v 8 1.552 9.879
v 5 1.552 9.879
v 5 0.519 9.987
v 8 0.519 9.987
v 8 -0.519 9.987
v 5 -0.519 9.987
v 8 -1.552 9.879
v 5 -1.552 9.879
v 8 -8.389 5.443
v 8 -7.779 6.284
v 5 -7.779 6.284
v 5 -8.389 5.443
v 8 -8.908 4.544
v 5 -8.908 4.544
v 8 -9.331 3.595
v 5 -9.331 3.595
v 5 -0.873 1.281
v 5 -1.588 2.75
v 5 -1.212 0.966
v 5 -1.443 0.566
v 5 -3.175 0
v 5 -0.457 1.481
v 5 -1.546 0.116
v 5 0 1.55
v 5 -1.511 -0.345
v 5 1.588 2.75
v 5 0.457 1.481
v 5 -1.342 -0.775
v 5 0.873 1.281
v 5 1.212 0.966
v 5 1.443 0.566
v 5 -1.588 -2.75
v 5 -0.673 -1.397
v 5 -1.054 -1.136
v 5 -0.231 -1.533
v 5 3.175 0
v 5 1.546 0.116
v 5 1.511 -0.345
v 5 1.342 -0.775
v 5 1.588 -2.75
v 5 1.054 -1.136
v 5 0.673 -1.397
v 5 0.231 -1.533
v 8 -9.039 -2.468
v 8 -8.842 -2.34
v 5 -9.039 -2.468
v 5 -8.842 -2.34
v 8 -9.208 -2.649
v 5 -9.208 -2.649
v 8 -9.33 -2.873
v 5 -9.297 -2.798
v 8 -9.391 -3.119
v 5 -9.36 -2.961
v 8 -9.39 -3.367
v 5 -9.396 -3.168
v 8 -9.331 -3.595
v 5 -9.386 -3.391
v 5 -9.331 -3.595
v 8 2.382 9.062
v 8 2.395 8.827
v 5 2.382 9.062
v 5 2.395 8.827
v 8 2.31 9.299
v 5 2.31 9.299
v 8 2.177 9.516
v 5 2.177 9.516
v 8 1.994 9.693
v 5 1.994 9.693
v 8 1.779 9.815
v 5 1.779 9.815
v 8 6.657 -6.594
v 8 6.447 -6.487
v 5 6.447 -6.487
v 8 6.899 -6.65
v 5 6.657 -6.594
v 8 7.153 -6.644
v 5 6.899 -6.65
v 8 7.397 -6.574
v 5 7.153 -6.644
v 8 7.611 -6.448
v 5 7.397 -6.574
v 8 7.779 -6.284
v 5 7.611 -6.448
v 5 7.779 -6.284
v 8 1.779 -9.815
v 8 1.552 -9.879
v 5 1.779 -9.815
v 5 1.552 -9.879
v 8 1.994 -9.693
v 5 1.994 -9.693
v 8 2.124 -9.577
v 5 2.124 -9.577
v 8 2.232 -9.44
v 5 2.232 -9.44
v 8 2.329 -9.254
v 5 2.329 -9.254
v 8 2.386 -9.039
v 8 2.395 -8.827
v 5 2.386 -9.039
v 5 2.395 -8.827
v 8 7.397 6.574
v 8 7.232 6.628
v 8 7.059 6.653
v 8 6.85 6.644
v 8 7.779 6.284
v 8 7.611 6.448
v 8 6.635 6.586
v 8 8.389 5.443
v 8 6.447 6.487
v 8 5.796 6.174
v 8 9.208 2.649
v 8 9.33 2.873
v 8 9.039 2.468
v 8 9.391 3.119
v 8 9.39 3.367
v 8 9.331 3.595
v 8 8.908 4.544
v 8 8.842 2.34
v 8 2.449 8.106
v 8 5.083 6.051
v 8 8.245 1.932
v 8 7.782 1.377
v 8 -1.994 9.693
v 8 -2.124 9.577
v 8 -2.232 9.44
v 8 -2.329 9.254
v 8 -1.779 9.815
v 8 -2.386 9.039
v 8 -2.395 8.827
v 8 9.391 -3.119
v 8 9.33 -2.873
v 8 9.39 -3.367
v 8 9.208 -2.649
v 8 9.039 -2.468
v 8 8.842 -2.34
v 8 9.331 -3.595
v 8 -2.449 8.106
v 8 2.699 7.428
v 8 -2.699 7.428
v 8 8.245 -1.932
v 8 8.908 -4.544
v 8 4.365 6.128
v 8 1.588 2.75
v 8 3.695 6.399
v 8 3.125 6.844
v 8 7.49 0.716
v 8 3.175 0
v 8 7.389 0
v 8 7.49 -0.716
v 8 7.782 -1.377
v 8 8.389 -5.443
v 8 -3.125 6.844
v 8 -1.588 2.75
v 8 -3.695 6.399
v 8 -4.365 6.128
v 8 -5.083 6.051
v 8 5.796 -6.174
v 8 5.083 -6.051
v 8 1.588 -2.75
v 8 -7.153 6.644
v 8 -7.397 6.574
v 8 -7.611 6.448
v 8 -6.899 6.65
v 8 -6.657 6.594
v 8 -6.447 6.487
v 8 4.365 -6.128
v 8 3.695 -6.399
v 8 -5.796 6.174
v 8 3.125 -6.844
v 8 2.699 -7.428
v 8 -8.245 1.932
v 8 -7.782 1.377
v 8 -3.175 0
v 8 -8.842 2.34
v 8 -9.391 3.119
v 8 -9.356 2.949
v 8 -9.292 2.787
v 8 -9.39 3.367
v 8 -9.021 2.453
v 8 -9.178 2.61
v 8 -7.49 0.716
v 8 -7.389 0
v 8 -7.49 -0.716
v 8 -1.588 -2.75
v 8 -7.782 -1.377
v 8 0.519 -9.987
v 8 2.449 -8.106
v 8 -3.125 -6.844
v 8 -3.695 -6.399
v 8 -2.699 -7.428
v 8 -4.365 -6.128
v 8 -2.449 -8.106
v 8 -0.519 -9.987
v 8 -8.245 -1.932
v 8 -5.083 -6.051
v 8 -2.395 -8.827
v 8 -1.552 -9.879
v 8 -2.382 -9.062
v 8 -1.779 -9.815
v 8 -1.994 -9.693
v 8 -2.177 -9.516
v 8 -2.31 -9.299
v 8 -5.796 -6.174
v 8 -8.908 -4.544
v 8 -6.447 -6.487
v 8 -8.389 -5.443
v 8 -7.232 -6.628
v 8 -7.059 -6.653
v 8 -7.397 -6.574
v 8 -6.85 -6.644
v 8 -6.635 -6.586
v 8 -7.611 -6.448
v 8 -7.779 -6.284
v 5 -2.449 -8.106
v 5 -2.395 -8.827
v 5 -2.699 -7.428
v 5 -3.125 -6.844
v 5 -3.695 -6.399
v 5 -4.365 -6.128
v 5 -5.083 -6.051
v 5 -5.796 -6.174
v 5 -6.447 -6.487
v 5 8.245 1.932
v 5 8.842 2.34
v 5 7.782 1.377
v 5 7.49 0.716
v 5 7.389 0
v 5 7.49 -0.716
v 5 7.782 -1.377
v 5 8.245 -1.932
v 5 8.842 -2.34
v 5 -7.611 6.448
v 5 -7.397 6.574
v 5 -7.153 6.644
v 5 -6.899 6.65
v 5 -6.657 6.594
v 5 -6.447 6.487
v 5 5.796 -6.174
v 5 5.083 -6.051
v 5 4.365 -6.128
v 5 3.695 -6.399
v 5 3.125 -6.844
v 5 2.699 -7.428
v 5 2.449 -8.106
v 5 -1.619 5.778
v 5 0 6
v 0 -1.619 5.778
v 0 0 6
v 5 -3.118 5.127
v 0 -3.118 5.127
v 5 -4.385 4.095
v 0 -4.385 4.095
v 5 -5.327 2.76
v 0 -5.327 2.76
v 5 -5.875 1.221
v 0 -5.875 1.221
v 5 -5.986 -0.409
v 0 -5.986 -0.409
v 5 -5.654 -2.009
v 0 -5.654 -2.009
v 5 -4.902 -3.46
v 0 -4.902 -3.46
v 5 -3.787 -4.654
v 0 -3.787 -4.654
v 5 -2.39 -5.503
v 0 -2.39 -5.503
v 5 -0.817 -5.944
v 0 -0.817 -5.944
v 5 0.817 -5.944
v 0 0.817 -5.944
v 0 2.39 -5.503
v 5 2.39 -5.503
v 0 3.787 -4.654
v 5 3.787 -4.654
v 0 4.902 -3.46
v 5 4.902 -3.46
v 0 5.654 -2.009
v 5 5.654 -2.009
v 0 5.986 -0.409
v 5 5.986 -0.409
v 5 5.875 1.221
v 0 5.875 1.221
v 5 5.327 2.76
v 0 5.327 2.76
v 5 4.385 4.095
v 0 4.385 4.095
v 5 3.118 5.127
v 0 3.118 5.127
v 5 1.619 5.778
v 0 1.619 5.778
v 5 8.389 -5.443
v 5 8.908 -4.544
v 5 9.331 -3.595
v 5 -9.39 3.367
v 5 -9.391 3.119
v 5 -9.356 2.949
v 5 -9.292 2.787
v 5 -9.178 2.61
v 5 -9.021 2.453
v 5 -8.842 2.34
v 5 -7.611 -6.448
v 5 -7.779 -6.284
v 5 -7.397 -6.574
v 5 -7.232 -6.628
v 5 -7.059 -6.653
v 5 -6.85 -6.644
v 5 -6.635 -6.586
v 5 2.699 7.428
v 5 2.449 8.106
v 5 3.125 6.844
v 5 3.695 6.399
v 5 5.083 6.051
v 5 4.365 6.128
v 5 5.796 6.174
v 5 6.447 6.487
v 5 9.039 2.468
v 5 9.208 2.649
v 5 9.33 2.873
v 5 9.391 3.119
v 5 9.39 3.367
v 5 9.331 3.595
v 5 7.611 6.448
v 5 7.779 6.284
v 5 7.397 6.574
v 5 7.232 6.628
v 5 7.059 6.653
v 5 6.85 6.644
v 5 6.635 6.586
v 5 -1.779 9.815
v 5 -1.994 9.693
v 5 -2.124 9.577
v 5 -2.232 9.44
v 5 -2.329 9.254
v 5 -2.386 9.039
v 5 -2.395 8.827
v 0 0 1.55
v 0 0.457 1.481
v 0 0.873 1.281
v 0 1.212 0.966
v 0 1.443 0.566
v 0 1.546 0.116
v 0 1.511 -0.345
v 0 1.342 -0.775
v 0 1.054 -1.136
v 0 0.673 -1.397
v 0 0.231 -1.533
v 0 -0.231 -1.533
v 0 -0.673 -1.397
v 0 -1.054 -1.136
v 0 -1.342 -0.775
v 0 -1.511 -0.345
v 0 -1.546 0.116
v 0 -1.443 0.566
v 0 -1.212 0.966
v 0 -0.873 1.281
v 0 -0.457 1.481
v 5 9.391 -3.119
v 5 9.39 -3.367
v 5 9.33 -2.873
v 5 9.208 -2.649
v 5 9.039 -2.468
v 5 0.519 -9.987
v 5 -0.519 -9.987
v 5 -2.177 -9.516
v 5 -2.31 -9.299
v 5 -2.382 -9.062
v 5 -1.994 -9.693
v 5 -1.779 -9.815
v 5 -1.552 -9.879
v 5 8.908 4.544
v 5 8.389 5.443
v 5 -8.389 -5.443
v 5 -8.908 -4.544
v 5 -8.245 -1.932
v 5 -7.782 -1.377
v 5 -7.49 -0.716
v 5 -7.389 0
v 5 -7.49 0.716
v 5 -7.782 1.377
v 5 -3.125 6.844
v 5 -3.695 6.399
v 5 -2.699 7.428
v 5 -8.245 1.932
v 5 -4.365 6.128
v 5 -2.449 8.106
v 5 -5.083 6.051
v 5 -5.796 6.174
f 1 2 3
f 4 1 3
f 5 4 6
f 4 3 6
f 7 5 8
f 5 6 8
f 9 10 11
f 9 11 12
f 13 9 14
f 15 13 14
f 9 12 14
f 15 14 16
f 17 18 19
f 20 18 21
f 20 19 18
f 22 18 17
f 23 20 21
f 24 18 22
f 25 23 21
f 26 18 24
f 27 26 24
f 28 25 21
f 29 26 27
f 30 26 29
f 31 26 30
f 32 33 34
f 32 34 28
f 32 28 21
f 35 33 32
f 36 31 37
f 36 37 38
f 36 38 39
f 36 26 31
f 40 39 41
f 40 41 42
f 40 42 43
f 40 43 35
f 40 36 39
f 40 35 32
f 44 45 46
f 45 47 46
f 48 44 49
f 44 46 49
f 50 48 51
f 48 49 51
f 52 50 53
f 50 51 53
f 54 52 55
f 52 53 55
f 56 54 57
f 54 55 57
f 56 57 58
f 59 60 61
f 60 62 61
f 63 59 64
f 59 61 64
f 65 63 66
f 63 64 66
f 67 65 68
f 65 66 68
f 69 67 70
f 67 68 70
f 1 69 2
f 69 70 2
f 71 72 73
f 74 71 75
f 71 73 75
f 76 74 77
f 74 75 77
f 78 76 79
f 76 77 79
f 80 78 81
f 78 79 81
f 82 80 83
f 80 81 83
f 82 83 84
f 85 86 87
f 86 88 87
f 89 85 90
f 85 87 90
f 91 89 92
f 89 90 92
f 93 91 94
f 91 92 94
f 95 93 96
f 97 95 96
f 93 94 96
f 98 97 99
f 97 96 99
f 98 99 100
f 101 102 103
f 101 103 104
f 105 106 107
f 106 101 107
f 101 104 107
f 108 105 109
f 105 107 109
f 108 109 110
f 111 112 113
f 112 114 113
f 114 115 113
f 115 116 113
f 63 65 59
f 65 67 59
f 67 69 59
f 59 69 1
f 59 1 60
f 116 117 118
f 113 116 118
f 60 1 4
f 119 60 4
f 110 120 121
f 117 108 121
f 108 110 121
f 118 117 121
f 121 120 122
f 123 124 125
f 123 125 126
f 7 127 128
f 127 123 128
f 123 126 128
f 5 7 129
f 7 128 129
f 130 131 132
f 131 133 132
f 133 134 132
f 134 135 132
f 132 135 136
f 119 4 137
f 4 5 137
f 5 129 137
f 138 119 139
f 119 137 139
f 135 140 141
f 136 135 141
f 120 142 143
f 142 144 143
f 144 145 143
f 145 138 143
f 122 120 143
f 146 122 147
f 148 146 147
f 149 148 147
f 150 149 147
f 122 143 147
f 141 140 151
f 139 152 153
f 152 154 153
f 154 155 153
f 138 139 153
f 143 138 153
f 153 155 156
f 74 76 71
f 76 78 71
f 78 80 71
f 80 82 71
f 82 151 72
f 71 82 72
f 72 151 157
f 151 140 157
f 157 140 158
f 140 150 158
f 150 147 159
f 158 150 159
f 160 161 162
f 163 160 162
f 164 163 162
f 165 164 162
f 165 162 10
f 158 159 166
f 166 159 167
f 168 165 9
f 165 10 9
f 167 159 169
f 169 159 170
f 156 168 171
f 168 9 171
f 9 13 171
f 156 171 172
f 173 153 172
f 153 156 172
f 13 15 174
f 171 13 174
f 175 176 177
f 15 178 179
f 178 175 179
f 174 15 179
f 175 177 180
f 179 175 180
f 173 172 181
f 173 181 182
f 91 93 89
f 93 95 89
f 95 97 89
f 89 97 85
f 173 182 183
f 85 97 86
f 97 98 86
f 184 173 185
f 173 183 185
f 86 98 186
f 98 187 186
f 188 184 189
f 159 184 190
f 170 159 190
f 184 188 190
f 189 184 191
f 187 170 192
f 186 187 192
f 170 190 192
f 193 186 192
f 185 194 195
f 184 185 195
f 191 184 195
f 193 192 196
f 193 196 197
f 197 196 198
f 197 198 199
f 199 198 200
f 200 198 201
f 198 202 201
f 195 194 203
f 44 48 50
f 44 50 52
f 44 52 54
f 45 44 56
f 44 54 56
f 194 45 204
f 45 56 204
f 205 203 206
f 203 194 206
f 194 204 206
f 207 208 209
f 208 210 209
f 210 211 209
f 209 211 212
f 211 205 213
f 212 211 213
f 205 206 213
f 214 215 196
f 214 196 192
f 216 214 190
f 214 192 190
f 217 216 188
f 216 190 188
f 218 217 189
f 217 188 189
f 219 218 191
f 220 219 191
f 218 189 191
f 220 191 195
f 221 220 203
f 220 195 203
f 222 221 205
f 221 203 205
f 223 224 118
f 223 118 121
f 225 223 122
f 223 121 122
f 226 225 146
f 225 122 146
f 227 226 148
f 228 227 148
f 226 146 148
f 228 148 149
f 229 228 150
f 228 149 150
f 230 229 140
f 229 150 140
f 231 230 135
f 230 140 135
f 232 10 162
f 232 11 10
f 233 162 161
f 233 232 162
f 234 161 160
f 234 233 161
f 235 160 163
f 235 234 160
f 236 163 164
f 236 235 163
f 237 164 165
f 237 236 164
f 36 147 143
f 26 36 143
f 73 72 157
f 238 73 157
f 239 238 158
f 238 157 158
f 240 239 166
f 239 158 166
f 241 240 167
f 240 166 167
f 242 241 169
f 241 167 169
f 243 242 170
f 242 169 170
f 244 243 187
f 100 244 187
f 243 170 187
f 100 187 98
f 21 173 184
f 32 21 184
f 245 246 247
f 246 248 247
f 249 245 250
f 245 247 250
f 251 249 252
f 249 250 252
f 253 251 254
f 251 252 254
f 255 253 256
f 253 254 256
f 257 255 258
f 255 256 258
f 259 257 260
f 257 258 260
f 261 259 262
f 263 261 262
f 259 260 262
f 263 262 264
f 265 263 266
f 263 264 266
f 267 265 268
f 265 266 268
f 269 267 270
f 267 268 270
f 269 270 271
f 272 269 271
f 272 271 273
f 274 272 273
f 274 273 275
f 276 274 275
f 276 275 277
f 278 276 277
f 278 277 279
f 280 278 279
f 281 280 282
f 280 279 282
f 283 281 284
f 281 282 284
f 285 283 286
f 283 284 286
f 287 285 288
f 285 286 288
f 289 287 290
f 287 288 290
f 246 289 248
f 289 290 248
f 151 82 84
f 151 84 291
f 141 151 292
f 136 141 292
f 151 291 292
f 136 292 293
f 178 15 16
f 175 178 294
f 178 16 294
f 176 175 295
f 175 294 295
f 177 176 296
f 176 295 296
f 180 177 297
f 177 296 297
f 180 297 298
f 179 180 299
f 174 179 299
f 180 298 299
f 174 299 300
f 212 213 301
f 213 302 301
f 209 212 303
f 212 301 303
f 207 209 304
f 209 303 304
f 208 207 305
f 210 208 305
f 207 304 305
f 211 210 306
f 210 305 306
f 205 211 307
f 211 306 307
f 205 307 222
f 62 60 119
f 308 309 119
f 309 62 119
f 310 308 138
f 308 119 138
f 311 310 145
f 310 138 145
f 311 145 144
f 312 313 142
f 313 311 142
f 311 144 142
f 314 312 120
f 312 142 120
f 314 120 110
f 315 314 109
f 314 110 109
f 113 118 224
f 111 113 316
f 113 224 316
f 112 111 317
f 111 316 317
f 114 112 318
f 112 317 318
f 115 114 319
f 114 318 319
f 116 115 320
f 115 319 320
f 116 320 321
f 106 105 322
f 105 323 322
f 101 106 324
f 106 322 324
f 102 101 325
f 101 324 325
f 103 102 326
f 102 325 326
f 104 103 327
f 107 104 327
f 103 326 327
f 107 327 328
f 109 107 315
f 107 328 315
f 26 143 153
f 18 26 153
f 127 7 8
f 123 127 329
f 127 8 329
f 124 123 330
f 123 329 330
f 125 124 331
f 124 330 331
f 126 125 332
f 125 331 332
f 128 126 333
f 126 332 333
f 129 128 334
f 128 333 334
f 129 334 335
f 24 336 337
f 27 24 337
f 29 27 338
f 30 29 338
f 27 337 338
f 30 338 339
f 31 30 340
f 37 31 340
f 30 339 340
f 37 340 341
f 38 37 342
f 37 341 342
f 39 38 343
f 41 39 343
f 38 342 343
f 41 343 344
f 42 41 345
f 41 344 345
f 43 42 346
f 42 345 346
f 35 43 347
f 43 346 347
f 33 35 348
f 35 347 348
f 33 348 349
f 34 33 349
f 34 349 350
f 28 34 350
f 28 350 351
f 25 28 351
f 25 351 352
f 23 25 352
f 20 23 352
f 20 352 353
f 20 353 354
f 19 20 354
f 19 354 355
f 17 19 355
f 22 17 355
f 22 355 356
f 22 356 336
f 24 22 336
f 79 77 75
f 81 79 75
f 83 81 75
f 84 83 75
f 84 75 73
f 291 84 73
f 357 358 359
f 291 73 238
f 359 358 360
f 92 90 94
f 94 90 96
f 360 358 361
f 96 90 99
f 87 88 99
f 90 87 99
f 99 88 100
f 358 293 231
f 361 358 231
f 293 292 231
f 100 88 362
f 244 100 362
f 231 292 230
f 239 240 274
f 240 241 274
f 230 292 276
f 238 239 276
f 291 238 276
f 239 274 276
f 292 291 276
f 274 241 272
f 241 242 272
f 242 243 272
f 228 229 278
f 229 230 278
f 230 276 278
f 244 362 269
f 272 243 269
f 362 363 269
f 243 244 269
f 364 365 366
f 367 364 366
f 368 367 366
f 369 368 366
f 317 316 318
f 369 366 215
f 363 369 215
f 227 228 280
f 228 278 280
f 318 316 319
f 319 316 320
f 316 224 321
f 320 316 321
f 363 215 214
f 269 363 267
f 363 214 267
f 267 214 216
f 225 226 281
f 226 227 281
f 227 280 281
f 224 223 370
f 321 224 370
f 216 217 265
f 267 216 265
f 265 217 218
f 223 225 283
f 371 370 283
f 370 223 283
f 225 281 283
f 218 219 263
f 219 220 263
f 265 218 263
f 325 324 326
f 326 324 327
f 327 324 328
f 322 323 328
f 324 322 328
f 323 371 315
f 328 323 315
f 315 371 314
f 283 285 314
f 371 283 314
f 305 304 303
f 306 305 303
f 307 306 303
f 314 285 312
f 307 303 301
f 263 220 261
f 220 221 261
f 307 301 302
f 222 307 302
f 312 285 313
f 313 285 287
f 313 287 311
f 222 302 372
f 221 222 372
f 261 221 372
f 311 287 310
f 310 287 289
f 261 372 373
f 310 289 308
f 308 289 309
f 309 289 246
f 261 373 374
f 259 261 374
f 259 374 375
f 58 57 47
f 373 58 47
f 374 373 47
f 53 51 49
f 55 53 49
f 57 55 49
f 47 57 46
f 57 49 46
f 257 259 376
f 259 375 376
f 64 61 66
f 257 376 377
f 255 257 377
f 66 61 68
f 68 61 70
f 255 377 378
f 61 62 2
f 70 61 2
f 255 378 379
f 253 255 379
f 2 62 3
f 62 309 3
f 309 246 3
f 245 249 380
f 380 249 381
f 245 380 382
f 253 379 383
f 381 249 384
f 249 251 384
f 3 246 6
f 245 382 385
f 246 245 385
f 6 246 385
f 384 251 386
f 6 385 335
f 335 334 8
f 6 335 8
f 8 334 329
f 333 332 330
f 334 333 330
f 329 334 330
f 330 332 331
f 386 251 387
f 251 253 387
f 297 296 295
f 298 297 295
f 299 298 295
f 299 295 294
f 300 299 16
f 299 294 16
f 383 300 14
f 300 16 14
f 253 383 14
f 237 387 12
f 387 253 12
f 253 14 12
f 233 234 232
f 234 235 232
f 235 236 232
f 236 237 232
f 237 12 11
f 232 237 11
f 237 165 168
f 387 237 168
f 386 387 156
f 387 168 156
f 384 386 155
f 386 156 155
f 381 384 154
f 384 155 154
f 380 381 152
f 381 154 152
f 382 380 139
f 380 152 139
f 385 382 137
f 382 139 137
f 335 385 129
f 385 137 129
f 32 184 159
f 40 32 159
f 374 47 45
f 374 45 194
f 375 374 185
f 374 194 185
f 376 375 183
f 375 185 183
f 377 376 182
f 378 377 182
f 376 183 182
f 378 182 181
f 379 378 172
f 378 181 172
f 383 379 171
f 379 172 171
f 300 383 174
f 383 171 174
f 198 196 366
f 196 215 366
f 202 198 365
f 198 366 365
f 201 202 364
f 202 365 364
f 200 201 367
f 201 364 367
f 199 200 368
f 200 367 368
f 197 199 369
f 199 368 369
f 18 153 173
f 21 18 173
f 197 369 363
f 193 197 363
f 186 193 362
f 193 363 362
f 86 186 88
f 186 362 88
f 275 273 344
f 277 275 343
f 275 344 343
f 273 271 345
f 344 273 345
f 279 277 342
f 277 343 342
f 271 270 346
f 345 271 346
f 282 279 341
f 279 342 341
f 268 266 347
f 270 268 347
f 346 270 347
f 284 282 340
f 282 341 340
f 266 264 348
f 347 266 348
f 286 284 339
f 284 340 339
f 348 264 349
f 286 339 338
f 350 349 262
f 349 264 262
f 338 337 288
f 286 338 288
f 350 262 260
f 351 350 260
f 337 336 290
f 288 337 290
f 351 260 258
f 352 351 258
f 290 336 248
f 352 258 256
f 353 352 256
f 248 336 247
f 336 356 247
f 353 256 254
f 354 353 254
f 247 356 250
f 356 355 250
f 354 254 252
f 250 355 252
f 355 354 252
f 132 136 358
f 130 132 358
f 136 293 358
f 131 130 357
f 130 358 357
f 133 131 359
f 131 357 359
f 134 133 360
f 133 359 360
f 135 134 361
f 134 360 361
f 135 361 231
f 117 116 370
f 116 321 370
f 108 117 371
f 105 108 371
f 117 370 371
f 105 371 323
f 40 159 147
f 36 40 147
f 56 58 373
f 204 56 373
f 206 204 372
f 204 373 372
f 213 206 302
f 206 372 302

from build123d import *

# Parameters (mm, degrees)
SKETCH3_R          = 1.55
CUT_EXTRUDE1_DEPTH = 17.248076809
SKETCH4_R          = 2.610523844
CUT_EXTRUDE2_DEPTH = 17.248076809
FILLET1_R          = 1
CUT_EXTRUDE3_DEPTH = 3


with BuildPart() as part:
    # Sketch2 → Revolve1 (revolve)
    with BuildSketch(Plane.XY, mode=Mode.PRIVATE) as revolve1_sk:
        Polygon((0, 0), (8, 0), (8, 10), (5, 10), (5, 6), (0, 6), align=None)
    revolve(revolve1_sk.sketch.rotate(Axis((0, 0, 0), (1, 0, 0)), 90), axis=Axis((0, 0, 0), (1, 0, 0)))

    # Sketch3 → Cut-Extrude1 (cut, through all)
    with BuildSketch(Plane.ZY):
        Circle(SKETCH3_R)
    extrude(amount=-CUT_EXTRUDE1_DEPTH, mode=Mode.SUBTRACT)

    # Sketch4 → Cut-Extrude2 (cut, through all)
    with BuildSketch(Plane(origin=(8, 0, 0), x_dir=(0, 0, -1), z_dir=(1, 0, 0))):
        with Locations((0, 10)):
            Circle(SKETCH4_R)
        with Locations((8.660254038, 5)):
            Circle(SKETCH4_R)
        with Locations((8.660254038, -5)):
            Circle(SKETCH4_R)
        with Locations((0, -10)):
            Circle(SKETCH4_R)
        with Locations((-8.660254038, -5)):
            Circle(SKETCH4_R)
        with Locations((-8.660254038, 5)):
            Circle(SKETCH4_R)
    extrude(amount=-CUT_EXTRUDE2_DEPTH, mode=Mode.SUBTRACT)

    # Fillet1
    fillet1_edges = [part.edges().sort_by_distance(p)[0] for p in [
        (6.5, 2.588190451, -9.659258263),
        (6.5, 7.071067812, -7.071067812),
        (6.5, -7.071067812, -7.071067812),
        (6.5, -2.588190451, -9.659258263),
        (6.5, -9.659258263, 2.588190451),
        (6.5, -9.659258263, -2.588190451),
        (6.5, -2.588190451, 9.659258263),
        (6.5, -7.071067812, 7.071067812),
        (6.5, 7.071067812, 7.071067812),
        (6.5, 2.588190451, 9.659258263),
        (6.5, 9.659258263, -2.588190451),
        (6.5, 9.659258263, 2.588190451),
    ]]
    fillet(fillet1_edges, radius=FILLET1_R)

    # Sketch5 → Cut-Extrude3 (cut)
    with BuildSketch(Plane(origin=(8, 0, 0), x_dir=(0, 0, -1), z_dir=(1, 0, 0))):
        Polygon((2.749630657, 1.5875), (0, 3.175), (-2.749630657, 1.5875), (-2.749630657, -1.5875), (0, -3.175), (2.749630657, -1.5875), align=None)
    extrude(amount=-CUT_EXTRUDE3_DEPTH, mode=Mode.SUBTRACT)


solid = part.part
